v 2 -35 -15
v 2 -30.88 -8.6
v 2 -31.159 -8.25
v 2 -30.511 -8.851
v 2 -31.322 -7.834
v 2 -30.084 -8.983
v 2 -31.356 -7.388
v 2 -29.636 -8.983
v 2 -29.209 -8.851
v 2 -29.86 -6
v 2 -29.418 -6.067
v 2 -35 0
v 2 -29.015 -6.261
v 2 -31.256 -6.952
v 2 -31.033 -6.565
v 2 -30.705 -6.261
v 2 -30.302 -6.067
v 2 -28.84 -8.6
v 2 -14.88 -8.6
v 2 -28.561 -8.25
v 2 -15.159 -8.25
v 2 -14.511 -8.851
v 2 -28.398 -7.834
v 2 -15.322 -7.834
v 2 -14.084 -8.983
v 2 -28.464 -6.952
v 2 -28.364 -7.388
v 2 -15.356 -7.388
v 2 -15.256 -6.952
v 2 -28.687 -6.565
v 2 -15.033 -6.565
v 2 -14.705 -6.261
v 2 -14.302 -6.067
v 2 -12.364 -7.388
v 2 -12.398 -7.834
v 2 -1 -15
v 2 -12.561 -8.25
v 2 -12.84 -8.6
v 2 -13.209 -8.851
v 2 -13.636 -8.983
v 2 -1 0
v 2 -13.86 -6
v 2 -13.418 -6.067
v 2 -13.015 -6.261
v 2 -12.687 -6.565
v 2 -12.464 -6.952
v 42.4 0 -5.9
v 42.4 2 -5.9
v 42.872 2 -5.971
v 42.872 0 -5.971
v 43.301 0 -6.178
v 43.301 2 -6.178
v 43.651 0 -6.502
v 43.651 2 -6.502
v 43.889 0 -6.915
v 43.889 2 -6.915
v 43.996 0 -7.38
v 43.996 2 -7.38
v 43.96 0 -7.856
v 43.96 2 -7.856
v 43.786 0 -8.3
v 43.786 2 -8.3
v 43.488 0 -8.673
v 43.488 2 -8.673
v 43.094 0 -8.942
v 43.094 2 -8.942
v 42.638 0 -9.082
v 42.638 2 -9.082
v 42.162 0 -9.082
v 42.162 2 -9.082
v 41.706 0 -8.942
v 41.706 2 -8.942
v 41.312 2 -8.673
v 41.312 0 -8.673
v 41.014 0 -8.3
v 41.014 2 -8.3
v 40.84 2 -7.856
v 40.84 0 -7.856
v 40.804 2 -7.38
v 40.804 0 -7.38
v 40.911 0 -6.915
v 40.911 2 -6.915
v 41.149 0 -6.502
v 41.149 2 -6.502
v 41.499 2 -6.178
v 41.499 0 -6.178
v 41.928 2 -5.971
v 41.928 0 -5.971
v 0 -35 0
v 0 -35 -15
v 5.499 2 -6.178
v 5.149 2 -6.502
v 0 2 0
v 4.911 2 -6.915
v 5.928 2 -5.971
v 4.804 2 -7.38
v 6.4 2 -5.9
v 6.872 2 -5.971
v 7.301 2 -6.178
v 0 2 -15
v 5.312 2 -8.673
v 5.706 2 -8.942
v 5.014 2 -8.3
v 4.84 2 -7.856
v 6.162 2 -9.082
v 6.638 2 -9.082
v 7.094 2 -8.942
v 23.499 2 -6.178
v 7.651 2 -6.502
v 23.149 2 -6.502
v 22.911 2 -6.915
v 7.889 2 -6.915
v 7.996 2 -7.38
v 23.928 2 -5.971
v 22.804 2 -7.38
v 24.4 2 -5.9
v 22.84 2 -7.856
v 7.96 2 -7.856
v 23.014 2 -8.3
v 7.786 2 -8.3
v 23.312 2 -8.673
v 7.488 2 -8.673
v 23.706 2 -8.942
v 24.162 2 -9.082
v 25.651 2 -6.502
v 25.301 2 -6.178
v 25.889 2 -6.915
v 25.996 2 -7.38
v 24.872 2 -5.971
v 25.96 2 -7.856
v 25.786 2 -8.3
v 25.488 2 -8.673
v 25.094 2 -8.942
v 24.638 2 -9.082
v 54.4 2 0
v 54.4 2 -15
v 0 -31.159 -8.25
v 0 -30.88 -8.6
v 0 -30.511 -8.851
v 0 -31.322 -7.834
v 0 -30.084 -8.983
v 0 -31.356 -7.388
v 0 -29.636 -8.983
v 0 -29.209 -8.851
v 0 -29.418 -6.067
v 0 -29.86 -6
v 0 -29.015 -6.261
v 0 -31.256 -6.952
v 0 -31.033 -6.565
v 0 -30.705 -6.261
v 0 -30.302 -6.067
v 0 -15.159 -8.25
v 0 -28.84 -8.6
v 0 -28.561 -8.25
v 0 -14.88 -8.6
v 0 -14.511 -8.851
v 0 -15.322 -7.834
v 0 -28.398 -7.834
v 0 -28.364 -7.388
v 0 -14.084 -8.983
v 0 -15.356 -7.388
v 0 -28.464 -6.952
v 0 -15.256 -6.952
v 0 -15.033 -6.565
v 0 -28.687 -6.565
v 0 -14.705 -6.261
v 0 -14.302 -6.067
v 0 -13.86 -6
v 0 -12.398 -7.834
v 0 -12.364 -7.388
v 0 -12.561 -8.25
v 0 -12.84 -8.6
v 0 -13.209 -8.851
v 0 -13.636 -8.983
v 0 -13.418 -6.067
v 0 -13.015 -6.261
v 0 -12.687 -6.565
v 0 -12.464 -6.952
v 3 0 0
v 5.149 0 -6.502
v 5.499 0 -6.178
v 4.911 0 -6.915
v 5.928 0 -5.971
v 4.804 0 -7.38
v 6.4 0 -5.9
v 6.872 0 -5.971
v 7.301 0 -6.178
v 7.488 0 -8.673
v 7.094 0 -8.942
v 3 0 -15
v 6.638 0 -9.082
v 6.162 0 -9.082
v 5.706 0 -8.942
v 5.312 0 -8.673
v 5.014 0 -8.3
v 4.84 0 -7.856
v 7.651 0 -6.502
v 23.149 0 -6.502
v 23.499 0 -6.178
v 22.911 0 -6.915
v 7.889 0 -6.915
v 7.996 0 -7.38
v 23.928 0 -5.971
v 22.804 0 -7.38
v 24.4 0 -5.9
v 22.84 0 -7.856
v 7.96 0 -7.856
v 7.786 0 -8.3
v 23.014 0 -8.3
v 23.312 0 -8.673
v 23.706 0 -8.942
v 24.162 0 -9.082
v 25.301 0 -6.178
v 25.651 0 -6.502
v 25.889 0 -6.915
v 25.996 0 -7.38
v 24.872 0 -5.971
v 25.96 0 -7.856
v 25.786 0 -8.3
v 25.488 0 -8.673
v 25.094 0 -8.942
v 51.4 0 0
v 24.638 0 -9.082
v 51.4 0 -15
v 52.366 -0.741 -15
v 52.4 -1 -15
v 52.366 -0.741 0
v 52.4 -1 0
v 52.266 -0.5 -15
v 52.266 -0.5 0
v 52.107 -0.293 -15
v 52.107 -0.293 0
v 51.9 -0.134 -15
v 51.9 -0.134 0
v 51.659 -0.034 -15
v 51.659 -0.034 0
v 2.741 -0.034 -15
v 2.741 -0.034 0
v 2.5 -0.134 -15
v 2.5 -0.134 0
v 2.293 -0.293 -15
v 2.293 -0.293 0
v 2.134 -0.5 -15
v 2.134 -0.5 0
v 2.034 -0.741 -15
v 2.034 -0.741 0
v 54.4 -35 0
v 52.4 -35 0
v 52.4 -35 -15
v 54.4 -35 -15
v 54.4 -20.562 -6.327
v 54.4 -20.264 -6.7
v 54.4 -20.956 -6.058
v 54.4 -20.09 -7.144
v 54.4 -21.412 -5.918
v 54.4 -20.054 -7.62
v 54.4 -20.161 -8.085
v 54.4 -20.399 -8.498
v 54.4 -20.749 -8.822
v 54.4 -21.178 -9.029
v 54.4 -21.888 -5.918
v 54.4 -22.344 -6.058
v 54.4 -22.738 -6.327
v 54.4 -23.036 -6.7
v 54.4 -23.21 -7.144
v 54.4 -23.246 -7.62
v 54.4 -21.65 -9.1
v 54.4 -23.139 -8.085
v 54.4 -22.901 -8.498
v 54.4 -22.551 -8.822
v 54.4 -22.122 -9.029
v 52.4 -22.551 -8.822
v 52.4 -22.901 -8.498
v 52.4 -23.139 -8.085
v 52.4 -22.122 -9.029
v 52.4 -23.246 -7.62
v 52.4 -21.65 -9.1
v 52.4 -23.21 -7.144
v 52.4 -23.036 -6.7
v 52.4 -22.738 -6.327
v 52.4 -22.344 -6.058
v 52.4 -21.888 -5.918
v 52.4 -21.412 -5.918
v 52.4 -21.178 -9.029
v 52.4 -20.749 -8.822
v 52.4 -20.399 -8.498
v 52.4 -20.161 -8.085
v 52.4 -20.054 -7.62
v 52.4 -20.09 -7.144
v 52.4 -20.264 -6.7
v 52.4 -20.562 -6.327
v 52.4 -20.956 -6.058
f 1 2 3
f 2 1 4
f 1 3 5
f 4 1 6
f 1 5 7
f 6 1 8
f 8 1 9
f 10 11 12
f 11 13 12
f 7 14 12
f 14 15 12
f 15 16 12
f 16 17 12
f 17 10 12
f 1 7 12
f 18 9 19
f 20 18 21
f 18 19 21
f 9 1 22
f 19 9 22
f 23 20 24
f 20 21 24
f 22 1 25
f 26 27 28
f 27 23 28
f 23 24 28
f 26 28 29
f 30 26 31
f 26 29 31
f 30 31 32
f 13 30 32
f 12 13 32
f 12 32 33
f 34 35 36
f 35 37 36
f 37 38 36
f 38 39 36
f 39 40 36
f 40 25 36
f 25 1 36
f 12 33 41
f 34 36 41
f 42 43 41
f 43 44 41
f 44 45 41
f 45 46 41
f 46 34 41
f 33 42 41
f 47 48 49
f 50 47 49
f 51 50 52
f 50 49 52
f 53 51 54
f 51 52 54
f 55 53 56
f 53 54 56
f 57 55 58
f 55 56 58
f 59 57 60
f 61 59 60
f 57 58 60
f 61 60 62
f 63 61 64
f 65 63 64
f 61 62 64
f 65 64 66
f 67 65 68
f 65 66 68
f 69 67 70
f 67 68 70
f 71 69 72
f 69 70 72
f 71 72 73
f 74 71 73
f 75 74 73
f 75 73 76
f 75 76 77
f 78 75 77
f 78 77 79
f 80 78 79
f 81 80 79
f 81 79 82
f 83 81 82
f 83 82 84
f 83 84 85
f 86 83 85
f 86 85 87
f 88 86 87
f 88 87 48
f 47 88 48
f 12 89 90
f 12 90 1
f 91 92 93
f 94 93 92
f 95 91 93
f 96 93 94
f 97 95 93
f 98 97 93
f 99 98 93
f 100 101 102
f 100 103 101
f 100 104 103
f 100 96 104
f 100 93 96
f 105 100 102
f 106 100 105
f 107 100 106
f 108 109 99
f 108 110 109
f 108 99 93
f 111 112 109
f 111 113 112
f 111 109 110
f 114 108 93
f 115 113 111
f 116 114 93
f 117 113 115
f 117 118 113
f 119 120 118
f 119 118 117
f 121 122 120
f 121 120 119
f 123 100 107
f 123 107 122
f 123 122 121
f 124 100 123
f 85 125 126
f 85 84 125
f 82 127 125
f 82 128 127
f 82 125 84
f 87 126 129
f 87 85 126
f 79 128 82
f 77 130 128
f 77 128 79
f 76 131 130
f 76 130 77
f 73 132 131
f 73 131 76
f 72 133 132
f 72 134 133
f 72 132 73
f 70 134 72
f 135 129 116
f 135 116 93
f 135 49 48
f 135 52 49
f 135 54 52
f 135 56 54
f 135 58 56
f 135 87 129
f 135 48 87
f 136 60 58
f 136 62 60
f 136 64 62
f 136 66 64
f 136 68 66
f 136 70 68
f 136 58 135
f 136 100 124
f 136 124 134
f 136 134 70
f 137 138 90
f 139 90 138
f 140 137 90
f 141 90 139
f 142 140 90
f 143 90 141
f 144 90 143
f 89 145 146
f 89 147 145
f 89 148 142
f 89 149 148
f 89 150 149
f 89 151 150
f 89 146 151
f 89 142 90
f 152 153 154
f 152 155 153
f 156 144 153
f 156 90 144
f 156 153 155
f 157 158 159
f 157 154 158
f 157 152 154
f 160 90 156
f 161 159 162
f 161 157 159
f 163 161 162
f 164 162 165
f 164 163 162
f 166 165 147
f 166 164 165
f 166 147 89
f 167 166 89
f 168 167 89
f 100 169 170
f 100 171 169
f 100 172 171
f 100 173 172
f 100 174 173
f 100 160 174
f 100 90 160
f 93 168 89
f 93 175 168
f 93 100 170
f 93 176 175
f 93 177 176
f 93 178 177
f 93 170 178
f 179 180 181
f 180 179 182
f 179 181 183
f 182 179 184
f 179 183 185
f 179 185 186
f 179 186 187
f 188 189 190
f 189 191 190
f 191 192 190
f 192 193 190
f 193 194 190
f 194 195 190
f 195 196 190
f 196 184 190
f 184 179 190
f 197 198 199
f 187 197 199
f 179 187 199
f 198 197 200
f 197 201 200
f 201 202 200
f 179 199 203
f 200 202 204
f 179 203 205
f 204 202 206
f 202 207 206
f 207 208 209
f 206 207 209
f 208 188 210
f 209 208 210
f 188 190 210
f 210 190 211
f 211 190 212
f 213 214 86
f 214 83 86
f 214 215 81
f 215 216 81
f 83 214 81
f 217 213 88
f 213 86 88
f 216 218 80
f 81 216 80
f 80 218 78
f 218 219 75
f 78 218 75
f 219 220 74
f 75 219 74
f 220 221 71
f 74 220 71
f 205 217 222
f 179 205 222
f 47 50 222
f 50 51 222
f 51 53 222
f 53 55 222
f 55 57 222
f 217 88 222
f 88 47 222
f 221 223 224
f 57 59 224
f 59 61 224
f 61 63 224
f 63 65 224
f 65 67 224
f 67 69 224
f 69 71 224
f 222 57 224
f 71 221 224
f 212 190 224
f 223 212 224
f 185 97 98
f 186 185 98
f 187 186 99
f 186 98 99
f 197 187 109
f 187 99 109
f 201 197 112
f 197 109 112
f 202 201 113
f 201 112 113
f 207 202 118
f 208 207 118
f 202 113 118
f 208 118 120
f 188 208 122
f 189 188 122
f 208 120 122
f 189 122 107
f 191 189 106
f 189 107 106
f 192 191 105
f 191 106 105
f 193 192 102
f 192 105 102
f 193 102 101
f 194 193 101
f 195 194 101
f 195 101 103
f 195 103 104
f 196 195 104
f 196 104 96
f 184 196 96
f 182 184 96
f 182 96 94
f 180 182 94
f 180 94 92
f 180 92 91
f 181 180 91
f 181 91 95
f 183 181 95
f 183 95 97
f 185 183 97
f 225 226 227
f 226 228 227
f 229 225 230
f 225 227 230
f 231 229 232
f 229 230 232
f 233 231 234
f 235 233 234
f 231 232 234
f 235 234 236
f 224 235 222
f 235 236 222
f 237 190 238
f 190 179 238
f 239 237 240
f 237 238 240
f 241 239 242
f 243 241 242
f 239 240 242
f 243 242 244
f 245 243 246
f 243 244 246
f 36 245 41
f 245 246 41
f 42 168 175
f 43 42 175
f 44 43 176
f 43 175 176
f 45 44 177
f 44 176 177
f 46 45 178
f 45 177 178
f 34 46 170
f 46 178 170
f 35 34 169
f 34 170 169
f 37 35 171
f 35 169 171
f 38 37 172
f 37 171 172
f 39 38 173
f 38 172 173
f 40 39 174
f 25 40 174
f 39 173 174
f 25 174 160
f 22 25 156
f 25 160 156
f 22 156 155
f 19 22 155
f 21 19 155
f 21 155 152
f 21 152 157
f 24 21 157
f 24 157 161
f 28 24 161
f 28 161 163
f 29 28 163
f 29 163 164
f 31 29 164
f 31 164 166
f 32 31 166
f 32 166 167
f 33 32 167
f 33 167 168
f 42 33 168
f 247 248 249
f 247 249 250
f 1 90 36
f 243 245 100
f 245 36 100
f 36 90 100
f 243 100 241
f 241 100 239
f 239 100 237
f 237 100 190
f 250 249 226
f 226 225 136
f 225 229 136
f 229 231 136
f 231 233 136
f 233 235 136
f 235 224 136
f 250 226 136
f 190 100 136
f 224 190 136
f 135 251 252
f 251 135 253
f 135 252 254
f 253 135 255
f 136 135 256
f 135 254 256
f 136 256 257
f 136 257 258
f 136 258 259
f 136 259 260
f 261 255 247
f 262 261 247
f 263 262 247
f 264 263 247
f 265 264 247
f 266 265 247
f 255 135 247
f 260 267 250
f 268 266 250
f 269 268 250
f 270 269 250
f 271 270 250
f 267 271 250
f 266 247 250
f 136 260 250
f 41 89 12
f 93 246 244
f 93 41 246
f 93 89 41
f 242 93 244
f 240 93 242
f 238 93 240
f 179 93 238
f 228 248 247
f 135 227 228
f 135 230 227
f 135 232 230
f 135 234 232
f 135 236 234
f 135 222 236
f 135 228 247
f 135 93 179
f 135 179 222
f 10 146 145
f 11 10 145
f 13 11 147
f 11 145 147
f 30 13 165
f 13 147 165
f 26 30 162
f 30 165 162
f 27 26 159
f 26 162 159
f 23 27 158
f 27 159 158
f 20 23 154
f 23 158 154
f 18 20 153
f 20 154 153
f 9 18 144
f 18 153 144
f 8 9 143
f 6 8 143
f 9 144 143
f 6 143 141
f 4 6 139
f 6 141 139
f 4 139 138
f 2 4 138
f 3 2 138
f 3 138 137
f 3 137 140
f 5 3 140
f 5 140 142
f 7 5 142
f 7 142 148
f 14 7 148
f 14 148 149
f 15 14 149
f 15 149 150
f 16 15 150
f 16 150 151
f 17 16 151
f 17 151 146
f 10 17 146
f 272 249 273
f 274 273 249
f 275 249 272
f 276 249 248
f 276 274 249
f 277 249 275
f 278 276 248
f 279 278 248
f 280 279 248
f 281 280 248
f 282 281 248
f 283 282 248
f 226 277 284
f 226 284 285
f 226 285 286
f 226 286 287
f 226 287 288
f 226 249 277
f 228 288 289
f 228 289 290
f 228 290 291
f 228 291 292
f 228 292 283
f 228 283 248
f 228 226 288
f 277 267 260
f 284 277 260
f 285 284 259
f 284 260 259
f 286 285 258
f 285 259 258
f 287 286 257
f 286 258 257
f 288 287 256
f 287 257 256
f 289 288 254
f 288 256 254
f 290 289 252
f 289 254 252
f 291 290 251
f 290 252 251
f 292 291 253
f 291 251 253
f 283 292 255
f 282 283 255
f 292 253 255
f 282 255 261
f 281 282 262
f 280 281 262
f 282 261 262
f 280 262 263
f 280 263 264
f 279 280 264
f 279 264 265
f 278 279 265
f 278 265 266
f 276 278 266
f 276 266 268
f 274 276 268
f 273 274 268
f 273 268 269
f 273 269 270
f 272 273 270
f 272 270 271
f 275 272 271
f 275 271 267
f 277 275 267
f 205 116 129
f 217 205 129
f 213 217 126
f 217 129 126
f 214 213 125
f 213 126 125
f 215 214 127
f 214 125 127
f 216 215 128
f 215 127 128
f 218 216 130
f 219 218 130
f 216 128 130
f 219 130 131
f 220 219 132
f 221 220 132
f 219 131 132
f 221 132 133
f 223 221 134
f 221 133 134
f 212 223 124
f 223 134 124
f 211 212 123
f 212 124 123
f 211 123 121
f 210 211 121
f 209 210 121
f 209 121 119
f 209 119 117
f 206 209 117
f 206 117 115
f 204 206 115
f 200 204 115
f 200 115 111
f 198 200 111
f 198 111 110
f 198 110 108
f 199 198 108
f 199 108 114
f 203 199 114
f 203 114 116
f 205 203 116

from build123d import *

# Parameters (mm, degrees)
ESQUISSE1_W             = 54.4
ESQUISSE1_H             = 15
BOSS_EXTRU_1_DEPTH      = 2
ESQUISSE2_W             = 2
ESQUISSE2_H             = 15
BOSS_EXTRU_2_DEPTH      = 35
CONG_1_R                = 1
ENL_V_MAT_EXTRU_1_REACH = 68.403
ESQUISSE3_R             = 1.6
ENL_V_MAT_EXTRU_2_REACH = 69.479
ESQUISSE4_R             = 1.6
ENL_V_MAT_EXTRU_3_REACH = 68.403
ESQUISSE6_R             = 1.5


with BuildPart() as part:
    # Esquisse1 → Boss.-Extru.1 (new body)
    with BuildSketch(Plane(origin=(0, 0, 0), x_dir=(1, 0, 0), z_dir=(0, 1, 0))):
        with Locations((27.2, 7.5)):
            Rectangle(ESQUISSE1_W, ESQUISSE1_H)
    extrude(amount=BOSS_EXTRU_1_DEPTH)

    # Esquisse2 → Boss.-Extru.2 (add)
    with BuildSketch(Plane.XZ):
        with Locations((1, -7.5)):
            Rectangle(ESQUISSE2_W, ESQUISSE2_H)
        with Locations((53.4, -7.5)):
            Rectangle(ESQUISSE2_W, ESQUISSE2_H)
    extrude(amount=BOSS_EXTRU_2_DEPTH)

    # Congé1
    cong_1_edges = [part.edges().sort_by_distance(p)[0] for p in [
        (52.4, 0, -7.5),
        (2, 0, -7.5),
    ]]
    fillet(cong_1_edges, radius=CONG_1_R)

    # Esquisse3 → Enlèv. mat.-Extru.1 (cut, up to next)
    with BuildSketch(Plane(origin=(54.4, 0, 0), x_dir=(0, 0, -1), z_dir=(1, 0, 0)), mode=Mode.PRIVATE) as enl_v_mat_extru_1_sk1:
        with Locations((7.5, -21.65)):
            Circle(ESQUISSE3_R)
    enl_v_mat_extru_1_tool1 = extrude(enl_v_mat_extru_1_sk1.sketch, amount=-ENL_V_MAT_EXTRU_1_REACH, mode=Mode.PRIVATE) & part.part
    add(enl_v_mat_extru_1_tool1.solids().sort_by_distance((54.4, -21.65, -7.5))[0], mode=Mode.SUBTRACT)

    # Esquisse4 → Enlèv. mat.-Extru.2 (cut, up to next)
    with BuildSketch(Plane(origin=(0, 2, 0), x_dir=(1, 0, 0), z_dir=(0, 1, 0)), mode=Mode.PRIVATE) as enl_v_mat_extru_2_sk1:
        with Locations(Location((42.4, 7.5, 0), (0, 0, 270))):
            Circle(ESQUISSE4_R)
    enl_v_mat_extru_2_tool1 = extrude(enl_v_mat_extru_2_sk1.sketch, amount=-ENL_V_MAT_EXTRU_2_REACH, mode=Mode.PRIVATE) & part.part
    # Esquisse4 → Enlèv. mat.-Extru.2 (cut, up to next)
    with BuildSketch(Plane(origin=(0, 2, 0), x_dir=(1, 0, 0), z_dir=(0, 1, 0)), mode=Mode.PRIVATE) as enl_v_mat_extru_2_sk2:
        with Locations(Location((6.4, 7.5, 0), (0, 0, 270))):
            Circle(ESQUISSE4_R)
    enl_v_mat_extru_2_tool2 = extrude(enl_v_mat_extru_2_sk2.sketch, amount=-ENL_V_MAT_EXTRU_2_REACH, mode=Mode.PRIVATE) & part.part
    # Esquisse4 → Enlèv. mat.-Extru.2 (cut, up to next)
    with BuildSketch(Plane(origin=(0, 2, 0), x_dir=(1, 0, 0), z_dir=(0, 1, 0)), mode=Mode.PRIVATE) as enl_v_mat_extru_2_sk3:
        with Locations(Location((24.4, 7.5, 0), (0, 0, 270))):
            Circle(ESQUISSE4_R)
    enl_v_mat_extru_2_tool3 = extrude(enl_v_mat_extru_2_sk3.sketch, amount=-ENL_V_MAT_EXTRU_2_REACH, mode=Mode.PRIVATE) & part.part
    add(enl_v_mat_extru_2_tool1.solids().sort_by_distance((42.4, 2, -7.5))[0], mode=Mode.SUBTRACT)
    add(enl_v_mat_extru_2_tool2.solids().sort_by_distance((6.4, 2, -7.5))[0], mode=Mode.SUBTRACT)
    add(enl_v_mat_extru_2_tool3.solids().sort_by_distance((24.4, 2, -7.5))[0], mode=Mode.SUBTRACT)

    # Esquisse6 → Enlèv. mat.-Extru.3 (cut, up to next)
    with BuildSketch(Plane.ZY, mode=Mode.PRIVATE) as enl_v_mat_extru_3_sk1:
        with Locations((-7.5, -13.86)):
            Circle(ESQUISSE6_R)
    enl_v_mat_extru_3_tool1 = extrude(enl_v_mat_extru_3_sk1.sketch, amount=-ENL_V_MAT_EXTRU_3_REACH, mode=Mode.PRIVATE) & part.part
    # Esquisse6 → Enlèv. mat.-Extru.3 (cut, up to next)
    with BuildSketch(Plane.ZY, mode=Mode.PRIVATE) as enl_v_mat_extru_3_sk2:
        with Locations((-7.5, -29.86)):
            Circle(ESQUISSE6_R)
    enl_v_mat_extru_3_tool2 = extrude(enl_v_mat_extru_3_sk2.sketch, amount=-ENL_V_MAT_EXTRU_3_REACH, mode=Mode.PRIVATE) & part.part
    add(enl_v_mat_extru_3_tool1.solids().sort_by_distance((0, -13.86, -7.5))[0], mode=Mode.SUBTRACT)
    add(enl_v_mat_extru_3_tool2.solids().sort_by_distance((0, -29.86, -7.5))[0], mode=Mode.SUBTRACT)


solid = part.part
